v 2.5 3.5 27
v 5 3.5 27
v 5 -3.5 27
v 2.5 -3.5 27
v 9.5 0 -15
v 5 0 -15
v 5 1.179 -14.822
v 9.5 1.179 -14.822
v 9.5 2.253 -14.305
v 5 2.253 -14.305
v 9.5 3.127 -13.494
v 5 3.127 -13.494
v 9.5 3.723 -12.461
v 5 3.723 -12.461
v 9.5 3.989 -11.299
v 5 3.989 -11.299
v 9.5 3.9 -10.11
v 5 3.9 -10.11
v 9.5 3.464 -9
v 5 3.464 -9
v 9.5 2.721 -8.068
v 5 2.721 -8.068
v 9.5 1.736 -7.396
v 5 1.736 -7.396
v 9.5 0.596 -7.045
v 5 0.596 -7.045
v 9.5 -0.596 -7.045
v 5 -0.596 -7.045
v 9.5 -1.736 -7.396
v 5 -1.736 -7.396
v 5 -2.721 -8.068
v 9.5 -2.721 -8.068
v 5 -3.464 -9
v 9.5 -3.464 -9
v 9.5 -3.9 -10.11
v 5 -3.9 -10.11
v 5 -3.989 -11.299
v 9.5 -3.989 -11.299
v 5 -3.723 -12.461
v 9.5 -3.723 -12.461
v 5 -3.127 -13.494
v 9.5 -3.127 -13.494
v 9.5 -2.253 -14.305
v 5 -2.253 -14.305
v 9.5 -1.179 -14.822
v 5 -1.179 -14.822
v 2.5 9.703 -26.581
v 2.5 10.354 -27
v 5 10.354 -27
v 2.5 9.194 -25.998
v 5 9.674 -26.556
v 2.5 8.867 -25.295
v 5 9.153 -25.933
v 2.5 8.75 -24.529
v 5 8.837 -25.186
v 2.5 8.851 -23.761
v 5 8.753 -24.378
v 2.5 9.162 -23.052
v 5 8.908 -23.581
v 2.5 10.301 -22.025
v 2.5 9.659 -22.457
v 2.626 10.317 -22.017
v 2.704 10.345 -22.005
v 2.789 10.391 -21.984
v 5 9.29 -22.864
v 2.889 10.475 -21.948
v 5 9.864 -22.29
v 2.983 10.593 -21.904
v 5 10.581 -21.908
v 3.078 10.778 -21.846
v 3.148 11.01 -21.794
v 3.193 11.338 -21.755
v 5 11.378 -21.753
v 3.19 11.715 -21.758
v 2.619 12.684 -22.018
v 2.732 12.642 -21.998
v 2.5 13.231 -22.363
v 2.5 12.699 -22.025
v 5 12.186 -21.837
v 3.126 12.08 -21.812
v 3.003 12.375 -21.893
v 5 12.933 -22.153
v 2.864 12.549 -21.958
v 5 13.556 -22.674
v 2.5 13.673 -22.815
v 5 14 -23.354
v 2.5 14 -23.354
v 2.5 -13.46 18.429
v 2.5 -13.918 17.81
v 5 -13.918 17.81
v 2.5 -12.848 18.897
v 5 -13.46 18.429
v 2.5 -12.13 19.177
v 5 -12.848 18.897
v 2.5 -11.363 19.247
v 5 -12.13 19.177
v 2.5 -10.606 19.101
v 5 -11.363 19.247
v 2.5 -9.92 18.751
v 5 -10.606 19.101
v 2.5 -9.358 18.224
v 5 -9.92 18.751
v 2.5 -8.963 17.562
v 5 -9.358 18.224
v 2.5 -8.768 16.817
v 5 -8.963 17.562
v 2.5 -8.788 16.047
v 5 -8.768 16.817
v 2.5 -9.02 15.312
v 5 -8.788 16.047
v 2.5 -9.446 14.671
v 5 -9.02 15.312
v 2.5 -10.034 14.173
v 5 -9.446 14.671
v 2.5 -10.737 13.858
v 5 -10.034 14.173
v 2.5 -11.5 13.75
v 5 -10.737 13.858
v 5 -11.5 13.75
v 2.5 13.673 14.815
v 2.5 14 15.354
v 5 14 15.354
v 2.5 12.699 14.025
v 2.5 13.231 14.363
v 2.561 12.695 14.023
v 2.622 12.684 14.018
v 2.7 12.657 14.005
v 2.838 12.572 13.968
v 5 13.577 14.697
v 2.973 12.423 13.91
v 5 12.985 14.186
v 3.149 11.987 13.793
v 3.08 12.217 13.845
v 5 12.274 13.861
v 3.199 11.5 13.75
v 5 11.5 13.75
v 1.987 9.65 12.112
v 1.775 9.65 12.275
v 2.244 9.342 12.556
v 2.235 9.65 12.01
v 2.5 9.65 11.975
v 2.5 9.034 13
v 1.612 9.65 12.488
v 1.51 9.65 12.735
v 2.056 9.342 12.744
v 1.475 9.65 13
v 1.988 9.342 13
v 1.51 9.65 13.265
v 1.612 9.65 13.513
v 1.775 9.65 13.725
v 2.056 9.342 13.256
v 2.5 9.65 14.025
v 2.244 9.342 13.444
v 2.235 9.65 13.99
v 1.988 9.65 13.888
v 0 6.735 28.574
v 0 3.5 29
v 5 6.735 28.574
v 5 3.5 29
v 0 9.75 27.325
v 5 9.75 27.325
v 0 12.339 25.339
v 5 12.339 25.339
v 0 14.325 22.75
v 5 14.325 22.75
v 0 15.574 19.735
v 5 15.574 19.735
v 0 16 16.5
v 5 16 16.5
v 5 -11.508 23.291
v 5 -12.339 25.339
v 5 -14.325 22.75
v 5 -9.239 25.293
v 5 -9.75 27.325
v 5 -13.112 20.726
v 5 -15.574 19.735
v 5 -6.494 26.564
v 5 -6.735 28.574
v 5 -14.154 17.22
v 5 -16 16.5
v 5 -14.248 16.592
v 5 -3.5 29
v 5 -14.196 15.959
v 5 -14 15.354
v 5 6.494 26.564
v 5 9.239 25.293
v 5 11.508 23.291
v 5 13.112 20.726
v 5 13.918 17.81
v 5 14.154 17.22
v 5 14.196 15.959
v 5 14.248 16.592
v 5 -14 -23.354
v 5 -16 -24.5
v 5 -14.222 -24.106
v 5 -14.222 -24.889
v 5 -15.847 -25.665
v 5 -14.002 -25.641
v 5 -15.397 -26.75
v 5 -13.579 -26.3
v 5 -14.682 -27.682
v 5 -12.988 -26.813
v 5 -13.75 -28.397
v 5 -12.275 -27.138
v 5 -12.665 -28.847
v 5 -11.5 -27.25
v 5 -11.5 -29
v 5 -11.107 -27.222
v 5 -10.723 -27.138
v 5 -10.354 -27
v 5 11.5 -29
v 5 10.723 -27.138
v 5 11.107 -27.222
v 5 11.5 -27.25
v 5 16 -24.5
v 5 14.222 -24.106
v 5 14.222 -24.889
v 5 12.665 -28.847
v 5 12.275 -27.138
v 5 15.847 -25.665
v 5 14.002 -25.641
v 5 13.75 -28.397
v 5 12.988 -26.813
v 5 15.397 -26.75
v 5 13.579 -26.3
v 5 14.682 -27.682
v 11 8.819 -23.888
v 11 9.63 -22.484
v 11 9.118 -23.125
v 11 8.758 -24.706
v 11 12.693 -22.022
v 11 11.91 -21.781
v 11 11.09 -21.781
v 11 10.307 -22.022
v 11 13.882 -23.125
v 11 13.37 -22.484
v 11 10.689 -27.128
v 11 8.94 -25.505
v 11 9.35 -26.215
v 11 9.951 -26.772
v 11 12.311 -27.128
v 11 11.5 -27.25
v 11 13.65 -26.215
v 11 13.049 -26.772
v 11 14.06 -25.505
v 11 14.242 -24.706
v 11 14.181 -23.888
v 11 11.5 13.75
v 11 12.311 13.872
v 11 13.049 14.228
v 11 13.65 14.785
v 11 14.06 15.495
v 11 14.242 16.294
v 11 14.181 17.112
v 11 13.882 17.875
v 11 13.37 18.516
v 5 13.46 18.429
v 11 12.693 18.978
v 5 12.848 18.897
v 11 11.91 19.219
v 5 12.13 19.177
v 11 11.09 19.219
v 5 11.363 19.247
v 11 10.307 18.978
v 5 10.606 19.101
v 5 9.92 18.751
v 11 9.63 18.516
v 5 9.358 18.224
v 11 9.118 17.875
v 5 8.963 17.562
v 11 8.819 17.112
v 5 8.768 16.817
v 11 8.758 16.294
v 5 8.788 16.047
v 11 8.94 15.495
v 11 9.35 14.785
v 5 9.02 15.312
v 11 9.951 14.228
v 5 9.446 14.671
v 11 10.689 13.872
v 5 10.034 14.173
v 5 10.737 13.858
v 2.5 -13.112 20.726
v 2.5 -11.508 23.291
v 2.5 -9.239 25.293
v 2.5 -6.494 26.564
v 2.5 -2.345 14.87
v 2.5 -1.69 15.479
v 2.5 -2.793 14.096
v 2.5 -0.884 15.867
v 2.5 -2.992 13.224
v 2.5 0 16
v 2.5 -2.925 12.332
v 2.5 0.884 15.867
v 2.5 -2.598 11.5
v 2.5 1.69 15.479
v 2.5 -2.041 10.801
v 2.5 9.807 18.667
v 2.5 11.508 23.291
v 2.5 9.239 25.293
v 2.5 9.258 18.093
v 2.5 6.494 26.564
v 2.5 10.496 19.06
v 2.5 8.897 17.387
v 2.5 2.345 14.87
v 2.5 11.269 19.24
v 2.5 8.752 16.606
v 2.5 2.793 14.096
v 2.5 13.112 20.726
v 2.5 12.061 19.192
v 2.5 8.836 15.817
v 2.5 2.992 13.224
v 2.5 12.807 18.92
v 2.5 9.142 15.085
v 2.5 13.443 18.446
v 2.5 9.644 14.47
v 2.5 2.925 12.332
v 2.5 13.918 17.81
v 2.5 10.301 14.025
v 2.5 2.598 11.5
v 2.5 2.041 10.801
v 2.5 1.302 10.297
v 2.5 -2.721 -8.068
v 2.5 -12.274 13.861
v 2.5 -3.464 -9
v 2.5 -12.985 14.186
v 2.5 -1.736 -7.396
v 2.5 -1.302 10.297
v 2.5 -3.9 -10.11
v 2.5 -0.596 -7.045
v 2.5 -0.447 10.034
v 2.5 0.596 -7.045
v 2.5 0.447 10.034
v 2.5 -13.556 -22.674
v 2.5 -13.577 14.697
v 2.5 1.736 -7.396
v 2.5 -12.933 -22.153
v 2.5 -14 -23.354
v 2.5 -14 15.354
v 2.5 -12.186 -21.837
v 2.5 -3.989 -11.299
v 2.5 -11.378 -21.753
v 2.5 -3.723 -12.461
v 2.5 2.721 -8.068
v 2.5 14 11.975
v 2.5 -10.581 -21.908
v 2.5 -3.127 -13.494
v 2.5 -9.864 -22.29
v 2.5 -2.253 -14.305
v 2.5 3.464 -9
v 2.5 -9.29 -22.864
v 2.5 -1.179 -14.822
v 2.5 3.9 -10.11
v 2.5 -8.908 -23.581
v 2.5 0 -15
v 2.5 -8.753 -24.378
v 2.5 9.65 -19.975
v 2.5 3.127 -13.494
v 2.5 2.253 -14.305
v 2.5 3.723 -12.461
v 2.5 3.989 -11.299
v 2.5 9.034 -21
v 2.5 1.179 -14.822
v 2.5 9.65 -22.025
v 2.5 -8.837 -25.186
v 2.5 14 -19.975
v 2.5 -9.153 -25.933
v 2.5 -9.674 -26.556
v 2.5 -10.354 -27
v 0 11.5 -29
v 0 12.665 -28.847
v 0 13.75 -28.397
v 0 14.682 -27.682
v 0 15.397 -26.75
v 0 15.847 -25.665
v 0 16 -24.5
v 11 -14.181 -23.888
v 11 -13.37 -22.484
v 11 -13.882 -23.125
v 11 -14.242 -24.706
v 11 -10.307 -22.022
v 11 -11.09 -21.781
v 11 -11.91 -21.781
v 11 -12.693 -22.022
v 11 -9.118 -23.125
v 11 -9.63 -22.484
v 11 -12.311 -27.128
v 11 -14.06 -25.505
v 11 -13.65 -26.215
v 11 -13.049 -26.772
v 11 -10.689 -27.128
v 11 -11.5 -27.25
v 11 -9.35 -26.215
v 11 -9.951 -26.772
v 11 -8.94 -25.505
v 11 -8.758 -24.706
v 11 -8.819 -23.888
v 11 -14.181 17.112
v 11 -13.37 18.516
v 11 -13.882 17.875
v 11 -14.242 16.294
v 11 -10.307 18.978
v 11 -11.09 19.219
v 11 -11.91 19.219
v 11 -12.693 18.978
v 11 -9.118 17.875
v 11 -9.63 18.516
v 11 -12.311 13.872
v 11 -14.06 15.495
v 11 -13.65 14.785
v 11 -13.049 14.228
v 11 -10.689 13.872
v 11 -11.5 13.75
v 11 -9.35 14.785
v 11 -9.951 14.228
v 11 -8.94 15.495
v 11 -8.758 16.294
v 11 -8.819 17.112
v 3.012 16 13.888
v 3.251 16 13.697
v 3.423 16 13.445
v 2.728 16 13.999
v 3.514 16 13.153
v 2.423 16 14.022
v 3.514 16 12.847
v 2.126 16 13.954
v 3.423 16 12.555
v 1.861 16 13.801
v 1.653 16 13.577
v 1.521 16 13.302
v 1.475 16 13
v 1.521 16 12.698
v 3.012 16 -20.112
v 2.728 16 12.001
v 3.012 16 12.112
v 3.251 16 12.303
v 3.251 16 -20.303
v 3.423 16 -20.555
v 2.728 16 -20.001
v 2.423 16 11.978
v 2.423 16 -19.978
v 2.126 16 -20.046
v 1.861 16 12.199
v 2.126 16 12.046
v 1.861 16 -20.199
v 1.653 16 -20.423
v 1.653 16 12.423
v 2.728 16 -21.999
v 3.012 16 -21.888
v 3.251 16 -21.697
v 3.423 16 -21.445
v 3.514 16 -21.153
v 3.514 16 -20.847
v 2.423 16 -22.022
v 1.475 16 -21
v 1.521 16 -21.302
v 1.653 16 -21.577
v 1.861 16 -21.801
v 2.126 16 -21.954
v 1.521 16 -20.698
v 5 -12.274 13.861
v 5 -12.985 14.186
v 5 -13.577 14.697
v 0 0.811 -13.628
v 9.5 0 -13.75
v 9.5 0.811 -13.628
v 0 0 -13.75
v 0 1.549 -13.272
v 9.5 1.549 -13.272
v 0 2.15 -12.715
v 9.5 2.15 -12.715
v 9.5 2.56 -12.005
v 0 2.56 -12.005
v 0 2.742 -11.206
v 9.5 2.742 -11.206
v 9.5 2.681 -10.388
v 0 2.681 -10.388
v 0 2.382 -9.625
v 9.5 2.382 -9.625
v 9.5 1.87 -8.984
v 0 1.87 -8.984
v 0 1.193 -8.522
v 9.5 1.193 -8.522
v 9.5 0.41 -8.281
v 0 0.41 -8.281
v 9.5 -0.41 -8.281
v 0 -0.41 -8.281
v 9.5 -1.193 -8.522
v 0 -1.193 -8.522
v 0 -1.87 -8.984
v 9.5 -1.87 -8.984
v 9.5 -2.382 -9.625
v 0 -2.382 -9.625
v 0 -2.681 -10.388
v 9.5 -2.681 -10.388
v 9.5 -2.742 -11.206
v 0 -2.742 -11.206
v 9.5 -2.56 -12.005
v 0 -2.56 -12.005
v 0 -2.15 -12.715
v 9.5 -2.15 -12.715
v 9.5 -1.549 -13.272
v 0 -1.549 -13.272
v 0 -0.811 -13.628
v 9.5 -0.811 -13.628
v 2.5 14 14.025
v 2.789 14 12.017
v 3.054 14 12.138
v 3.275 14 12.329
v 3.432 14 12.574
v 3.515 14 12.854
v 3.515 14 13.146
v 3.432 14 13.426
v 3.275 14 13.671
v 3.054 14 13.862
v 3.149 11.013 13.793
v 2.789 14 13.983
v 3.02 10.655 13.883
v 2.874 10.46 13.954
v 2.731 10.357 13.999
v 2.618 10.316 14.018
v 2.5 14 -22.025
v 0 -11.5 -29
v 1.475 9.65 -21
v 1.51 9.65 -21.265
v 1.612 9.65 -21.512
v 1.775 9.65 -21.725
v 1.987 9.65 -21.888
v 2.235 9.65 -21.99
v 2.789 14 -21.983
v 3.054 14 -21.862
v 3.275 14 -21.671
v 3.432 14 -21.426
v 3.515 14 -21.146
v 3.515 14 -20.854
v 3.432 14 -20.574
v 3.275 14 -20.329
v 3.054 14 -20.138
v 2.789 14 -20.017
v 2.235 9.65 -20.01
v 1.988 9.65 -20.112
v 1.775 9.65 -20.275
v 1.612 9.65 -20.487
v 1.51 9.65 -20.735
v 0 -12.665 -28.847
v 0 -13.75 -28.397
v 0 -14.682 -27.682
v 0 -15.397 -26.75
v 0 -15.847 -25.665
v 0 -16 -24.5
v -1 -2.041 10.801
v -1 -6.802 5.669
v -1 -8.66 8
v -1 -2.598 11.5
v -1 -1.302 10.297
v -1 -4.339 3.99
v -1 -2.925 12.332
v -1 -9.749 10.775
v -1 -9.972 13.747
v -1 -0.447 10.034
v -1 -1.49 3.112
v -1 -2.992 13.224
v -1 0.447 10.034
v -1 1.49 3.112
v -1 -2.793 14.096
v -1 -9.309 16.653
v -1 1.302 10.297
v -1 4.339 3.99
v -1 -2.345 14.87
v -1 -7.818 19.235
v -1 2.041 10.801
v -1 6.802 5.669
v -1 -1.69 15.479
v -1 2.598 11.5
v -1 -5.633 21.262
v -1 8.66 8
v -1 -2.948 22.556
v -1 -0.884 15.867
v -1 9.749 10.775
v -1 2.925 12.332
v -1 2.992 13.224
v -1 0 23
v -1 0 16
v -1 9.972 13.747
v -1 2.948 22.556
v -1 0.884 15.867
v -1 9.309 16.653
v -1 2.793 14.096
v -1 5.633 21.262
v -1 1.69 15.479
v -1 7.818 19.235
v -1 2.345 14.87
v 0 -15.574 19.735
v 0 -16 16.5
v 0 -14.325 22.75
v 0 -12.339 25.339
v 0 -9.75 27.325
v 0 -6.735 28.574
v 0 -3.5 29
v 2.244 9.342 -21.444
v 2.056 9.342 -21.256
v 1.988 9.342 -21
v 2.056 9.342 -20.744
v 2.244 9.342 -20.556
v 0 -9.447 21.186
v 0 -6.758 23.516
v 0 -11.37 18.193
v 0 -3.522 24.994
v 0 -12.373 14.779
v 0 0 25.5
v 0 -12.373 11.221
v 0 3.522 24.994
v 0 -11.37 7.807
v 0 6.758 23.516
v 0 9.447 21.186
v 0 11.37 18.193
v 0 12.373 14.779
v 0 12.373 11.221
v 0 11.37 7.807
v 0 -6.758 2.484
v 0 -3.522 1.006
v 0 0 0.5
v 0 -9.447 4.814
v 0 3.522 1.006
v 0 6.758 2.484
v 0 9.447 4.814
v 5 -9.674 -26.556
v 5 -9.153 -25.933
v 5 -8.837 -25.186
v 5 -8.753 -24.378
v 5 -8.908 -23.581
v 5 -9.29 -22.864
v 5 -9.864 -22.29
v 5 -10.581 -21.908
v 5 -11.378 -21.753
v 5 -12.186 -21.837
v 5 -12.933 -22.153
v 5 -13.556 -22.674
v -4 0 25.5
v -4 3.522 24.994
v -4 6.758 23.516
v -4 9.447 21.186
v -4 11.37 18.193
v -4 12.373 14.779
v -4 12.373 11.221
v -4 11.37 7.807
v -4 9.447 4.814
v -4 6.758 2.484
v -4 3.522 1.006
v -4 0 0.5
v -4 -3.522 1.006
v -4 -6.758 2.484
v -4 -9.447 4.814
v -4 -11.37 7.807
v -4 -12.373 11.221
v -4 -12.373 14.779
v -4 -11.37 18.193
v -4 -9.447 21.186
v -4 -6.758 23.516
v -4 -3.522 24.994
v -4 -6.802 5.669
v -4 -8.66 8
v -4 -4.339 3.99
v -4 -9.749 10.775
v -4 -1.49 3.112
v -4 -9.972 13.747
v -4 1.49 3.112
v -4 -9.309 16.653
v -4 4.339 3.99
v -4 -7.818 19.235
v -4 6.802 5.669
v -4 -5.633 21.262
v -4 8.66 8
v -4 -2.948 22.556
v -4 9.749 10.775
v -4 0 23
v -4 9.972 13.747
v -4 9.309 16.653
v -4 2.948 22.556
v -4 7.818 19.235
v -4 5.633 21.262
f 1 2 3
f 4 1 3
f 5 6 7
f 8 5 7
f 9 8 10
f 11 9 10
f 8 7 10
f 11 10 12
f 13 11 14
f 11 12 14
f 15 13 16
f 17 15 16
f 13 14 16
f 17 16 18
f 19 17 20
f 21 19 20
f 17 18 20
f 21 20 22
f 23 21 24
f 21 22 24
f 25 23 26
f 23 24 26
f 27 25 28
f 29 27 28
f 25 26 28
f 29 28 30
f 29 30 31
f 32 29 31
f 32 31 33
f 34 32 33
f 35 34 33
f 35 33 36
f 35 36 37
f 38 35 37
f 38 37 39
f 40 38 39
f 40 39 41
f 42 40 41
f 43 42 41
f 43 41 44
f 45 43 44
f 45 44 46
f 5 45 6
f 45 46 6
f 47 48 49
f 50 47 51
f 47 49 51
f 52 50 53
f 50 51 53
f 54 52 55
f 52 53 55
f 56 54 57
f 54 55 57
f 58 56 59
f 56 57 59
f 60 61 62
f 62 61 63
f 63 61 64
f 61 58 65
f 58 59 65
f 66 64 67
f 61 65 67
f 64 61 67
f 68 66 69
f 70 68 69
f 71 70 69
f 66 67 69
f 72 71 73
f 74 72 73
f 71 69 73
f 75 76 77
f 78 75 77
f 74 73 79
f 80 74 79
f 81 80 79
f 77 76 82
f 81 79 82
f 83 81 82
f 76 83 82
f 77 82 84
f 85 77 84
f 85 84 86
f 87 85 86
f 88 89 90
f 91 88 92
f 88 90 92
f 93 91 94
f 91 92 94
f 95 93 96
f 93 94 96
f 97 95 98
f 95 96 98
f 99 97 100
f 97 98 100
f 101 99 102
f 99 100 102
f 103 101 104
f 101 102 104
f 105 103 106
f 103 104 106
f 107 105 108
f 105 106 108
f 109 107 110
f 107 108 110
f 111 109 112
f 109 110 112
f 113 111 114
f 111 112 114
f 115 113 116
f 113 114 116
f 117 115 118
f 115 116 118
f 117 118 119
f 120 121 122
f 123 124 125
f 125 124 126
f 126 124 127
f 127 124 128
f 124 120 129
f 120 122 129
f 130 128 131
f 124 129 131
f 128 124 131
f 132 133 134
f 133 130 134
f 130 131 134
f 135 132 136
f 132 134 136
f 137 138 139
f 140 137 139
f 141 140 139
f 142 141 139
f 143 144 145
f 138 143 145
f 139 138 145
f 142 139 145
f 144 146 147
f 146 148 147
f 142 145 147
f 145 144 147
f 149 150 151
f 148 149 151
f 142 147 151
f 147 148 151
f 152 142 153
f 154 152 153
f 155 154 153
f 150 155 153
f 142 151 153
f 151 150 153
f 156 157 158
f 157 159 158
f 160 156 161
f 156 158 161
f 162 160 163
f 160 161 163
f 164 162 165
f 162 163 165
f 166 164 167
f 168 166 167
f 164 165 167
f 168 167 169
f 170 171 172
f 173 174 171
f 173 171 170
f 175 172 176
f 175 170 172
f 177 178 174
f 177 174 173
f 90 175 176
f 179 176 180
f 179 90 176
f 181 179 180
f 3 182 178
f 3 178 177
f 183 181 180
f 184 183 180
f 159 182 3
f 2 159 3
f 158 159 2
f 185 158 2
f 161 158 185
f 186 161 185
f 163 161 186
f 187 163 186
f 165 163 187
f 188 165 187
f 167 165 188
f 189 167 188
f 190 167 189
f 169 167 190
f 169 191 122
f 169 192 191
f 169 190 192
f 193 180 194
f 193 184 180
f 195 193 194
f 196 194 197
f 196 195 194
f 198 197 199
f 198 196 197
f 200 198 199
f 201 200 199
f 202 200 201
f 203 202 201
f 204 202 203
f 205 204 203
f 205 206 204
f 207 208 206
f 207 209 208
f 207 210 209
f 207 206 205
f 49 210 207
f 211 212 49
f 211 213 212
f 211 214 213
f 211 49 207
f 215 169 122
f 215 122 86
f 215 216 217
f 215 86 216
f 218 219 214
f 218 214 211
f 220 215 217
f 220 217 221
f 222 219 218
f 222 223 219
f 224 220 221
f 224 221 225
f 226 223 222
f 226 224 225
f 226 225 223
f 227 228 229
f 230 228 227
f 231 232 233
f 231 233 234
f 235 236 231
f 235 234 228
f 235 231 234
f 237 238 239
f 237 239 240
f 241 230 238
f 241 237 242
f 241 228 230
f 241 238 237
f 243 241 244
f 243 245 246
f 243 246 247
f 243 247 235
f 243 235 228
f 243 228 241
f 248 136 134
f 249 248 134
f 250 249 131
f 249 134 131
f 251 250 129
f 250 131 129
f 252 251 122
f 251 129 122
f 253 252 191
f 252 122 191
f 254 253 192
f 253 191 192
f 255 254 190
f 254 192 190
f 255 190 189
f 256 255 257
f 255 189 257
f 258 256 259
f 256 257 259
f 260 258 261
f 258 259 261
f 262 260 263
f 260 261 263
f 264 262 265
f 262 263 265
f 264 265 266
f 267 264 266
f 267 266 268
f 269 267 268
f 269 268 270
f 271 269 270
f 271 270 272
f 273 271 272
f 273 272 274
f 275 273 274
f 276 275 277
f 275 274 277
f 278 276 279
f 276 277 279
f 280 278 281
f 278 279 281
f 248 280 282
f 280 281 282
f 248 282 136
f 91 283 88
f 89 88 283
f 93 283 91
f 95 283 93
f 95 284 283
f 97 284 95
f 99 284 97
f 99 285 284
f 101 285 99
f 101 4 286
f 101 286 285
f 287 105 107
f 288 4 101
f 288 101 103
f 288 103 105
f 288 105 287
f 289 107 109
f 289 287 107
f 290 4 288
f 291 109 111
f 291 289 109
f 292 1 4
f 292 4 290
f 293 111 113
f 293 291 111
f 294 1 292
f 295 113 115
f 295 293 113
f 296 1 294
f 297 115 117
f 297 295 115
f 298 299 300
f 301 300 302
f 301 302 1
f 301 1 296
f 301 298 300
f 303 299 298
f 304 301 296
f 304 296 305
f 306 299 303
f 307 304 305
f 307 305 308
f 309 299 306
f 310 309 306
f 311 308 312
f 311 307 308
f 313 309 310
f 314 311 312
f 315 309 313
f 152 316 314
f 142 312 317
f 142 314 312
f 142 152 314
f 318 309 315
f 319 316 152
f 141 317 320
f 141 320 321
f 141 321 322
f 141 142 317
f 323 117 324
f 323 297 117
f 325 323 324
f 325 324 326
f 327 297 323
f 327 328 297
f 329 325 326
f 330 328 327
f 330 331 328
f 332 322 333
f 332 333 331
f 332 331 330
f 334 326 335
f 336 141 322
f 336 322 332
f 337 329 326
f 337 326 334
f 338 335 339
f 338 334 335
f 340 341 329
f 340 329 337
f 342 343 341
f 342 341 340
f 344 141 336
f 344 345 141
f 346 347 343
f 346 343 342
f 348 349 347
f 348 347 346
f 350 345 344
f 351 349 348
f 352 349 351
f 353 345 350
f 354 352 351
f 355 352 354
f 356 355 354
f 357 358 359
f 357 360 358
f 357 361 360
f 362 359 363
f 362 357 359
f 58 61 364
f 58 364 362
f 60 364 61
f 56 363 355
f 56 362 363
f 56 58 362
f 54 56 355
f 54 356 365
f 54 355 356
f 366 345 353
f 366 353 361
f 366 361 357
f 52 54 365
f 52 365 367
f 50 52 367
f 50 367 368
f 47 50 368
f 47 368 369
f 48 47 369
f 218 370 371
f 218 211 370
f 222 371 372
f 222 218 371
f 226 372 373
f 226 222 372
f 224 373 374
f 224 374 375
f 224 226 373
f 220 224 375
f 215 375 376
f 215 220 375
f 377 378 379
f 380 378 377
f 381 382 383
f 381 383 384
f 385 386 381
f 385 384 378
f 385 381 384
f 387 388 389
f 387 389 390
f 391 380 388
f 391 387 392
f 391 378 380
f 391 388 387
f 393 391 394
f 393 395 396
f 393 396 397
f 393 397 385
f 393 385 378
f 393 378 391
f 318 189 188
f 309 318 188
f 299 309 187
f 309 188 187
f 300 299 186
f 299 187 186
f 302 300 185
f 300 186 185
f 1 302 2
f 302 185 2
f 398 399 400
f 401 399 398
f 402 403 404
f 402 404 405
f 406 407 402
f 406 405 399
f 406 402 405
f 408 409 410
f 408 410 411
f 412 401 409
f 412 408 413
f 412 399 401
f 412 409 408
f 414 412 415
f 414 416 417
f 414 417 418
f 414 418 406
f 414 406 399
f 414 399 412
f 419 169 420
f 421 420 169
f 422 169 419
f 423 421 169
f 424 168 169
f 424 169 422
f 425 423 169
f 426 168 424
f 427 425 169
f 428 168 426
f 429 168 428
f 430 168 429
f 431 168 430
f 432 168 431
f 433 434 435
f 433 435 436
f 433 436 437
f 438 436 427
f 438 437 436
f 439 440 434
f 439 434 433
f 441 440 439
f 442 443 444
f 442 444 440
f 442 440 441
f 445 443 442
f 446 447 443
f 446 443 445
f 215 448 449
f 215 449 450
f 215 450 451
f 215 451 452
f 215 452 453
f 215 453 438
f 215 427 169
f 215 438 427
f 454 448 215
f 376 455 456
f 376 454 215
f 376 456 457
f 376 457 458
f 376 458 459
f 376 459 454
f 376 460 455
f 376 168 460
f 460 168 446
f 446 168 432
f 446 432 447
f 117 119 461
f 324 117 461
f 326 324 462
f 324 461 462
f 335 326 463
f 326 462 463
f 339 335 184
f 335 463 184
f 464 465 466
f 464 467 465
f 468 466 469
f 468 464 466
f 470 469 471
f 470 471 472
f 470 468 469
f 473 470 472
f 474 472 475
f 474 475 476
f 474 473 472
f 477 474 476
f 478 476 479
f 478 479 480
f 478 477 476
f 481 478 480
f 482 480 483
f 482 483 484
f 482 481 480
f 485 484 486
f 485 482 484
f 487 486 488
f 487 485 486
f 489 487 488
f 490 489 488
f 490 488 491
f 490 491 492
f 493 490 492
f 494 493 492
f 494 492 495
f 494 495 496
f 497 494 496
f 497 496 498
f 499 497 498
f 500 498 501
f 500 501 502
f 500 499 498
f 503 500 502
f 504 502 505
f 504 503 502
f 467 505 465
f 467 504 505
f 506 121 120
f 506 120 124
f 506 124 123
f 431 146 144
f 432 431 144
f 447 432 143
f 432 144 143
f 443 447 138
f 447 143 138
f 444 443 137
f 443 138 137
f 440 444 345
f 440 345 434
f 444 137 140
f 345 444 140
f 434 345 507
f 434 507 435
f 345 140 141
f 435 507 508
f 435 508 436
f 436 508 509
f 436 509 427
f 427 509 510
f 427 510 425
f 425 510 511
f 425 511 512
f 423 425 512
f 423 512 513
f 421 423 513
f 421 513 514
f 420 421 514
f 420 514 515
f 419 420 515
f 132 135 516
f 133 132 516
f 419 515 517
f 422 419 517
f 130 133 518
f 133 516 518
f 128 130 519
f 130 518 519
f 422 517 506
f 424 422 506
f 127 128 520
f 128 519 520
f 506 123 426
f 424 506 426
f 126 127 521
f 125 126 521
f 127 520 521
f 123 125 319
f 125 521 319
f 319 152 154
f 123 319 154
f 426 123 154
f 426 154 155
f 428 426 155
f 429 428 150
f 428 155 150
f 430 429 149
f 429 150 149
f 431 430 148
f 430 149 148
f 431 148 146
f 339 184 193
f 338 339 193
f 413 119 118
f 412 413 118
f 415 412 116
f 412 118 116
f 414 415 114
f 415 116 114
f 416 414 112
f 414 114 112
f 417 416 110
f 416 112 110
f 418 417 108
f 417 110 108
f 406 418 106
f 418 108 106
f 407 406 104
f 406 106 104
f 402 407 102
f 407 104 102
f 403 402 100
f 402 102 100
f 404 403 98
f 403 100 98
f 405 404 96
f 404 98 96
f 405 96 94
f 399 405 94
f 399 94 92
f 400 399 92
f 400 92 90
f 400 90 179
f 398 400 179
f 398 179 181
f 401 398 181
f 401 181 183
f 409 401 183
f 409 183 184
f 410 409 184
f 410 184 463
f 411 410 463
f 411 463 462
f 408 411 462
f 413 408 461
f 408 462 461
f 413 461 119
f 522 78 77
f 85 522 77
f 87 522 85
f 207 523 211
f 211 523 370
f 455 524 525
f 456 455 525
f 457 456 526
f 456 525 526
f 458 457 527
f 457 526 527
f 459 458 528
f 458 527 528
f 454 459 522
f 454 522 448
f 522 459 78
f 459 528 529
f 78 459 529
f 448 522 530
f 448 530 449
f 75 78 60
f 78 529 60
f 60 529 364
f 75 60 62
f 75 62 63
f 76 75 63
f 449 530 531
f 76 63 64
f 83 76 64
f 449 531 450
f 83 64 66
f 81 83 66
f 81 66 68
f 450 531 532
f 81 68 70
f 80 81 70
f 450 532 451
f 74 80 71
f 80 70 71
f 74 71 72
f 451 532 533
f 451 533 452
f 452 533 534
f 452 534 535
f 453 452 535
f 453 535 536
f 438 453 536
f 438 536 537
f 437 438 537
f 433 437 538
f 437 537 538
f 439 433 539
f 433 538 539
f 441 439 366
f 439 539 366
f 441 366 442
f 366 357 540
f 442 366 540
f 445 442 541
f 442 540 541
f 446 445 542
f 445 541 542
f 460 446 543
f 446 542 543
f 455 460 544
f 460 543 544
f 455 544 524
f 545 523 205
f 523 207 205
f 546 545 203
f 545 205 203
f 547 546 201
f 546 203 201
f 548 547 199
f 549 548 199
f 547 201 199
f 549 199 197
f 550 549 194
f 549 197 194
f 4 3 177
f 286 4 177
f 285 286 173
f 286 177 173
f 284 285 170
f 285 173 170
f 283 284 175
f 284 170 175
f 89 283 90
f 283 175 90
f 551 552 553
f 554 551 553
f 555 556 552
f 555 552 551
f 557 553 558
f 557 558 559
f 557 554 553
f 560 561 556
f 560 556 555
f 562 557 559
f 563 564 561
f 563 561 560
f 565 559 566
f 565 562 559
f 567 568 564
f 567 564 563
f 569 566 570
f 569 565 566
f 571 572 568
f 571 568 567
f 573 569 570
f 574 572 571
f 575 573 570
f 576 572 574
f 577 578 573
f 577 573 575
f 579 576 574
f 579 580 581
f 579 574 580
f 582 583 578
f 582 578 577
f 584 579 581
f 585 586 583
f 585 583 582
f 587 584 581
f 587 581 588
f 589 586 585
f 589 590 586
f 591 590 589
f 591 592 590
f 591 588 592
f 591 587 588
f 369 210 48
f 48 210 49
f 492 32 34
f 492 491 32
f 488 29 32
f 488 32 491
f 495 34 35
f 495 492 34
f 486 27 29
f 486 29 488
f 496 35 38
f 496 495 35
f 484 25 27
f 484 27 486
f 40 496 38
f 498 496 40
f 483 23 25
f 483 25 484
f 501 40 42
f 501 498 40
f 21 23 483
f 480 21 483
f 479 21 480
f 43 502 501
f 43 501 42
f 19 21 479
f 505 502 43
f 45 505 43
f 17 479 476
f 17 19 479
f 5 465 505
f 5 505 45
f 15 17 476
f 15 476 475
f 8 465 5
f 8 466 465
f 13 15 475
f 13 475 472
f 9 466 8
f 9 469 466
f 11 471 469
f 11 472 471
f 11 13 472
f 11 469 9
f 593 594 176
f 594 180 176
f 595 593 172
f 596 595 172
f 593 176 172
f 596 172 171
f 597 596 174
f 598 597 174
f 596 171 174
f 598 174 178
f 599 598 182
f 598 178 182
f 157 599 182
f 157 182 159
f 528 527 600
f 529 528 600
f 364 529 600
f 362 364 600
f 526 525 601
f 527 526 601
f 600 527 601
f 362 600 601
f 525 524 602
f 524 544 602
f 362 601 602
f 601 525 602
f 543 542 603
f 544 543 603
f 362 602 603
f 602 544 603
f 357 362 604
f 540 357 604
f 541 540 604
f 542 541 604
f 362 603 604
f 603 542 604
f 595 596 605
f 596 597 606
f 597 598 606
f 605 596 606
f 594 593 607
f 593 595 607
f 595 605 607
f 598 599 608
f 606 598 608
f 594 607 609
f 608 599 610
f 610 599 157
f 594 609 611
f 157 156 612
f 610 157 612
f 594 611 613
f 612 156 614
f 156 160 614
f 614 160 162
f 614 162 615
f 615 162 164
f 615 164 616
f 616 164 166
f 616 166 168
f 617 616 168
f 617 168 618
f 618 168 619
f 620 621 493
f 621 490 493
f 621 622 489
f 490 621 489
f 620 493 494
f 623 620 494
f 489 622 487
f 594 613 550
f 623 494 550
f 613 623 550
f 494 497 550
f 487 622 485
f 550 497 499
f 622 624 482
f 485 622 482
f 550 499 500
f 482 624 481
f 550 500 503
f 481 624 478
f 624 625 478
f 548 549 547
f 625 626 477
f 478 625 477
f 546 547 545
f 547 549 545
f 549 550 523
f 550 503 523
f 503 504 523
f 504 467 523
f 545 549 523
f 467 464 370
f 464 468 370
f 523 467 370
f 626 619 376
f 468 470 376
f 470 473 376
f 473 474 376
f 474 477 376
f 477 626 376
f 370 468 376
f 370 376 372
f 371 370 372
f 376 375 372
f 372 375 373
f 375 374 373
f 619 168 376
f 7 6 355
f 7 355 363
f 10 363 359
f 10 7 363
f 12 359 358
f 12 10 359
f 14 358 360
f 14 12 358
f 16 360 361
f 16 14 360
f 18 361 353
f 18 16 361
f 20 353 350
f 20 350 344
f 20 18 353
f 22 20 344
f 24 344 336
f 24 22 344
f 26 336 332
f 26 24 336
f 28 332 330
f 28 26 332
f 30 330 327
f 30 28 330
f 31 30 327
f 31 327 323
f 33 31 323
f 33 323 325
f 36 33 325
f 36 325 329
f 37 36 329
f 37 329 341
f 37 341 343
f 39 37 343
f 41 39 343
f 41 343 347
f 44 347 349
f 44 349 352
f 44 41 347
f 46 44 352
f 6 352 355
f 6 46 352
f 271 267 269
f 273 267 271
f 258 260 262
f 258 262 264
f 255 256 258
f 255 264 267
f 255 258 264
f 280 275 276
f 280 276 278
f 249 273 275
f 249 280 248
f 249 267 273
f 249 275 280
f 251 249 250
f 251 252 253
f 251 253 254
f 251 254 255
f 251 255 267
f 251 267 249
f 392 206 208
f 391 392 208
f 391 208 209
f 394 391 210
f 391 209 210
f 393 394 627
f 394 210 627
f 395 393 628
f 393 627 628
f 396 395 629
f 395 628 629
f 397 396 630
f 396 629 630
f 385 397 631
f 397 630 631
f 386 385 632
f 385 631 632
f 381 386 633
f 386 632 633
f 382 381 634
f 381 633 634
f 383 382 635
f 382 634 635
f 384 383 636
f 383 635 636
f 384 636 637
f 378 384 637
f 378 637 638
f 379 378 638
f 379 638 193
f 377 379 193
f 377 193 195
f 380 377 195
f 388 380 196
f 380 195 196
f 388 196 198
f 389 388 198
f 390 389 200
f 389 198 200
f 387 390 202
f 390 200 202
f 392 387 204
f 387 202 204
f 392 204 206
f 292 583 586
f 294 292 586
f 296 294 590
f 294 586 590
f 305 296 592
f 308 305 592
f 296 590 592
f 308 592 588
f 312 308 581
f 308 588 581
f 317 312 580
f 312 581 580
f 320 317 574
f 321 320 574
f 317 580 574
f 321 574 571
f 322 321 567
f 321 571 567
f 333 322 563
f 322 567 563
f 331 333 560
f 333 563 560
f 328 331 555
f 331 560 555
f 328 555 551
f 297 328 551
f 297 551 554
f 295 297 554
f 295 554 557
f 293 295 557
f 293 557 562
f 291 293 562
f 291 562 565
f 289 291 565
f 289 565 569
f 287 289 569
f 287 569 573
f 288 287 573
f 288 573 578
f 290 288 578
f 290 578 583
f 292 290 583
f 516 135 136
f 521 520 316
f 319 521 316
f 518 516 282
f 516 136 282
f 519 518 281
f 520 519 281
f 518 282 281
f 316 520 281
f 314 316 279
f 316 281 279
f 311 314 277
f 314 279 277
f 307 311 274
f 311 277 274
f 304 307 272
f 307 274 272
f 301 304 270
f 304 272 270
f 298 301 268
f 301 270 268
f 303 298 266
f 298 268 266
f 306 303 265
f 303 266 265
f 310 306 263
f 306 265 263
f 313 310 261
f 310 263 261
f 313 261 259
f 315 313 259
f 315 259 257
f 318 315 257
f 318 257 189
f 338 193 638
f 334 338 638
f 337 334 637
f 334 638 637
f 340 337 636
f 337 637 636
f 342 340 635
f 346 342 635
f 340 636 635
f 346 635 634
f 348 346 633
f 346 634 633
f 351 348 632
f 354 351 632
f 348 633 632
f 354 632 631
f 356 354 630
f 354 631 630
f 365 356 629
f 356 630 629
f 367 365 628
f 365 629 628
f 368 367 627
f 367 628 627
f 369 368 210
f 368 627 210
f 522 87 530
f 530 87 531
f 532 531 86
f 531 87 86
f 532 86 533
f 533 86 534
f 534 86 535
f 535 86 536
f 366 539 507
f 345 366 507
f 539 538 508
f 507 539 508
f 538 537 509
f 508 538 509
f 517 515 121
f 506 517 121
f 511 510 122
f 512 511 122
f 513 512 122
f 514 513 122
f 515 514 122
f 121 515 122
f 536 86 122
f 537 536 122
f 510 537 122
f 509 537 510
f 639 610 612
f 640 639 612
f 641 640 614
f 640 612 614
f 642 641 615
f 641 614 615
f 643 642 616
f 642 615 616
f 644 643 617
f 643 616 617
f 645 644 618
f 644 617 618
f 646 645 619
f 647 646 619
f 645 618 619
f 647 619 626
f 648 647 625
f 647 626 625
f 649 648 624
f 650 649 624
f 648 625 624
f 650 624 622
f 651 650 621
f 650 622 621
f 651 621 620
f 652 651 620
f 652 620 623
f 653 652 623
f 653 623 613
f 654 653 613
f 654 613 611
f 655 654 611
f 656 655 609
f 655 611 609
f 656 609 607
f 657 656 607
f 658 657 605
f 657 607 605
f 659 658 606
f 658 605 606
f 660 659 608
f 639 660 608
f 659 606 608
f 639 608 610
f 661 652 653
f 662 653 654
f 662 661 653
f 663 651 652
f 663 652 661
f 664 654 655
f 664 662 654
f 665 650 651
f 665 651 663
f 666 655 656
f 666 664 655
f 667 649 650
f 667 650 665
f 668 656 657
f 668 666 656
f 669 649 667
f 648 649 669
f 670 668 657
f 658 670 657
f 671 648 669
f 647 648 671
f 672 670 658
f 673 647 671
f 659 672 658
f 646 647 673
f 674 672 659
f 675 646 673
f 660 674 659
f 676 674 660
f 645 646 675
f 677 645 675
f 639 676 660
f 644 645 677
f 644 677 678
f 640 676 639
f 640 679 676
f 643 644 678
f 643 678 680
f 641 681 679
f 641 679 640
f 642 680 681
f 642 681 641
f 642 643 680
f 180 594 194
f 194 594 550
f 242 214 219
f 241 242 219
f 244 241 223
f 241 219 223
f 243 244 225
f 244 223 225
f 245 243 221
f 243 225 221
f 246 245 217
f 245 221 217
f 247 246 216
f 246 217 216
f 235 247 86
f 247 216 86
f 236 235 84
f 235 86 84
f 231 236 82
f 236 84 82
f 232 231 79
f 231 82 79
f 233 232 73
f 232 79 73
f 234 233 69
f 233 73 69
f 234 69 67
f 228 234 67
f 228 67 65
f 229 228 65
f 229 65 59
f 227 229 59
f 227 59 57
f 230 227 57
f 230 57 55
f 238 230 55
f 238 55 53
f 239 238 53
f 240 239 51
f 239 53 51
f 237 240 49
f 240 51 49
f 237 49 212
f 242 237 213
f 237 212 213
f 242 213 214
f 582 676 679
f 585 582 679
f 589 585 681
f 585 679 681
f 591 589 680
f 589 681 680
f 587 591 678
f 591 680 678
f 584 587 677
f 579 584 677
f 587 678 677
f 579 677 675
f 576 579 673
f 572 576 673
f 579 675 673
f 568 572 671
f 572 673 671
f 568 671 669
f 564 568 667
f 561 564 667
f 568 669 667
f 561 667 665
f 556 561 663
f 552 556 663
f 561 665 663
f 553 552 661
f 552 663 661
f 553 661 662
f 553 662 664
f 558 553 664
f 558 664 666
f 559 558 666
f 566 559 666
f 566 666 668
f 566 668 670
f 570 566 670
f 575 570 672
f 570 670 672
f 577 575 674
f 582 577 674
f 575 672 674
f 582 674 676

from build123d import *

# Parameters (mm, degrees)
SKETCH1_W                    = 58
SKETCH1_H                    = 32
SKETCH1_R                    = 2.75
BOSS_EXTRUDE1_DEPTH          = 5
SKETCH2_R                    = 4
SKETCH2_R_2                  = 2.75
BOSS_EXTRUDE2_DEPTH          = 4.5
FILLET1_R                    = 4.5
FILLET2_R                    = 12.5
SKETCH4_R                    = 2.75
BOSS_EXTRUDE3_DEPTH          = 6
SKETCH8_R                    = 12.5
BOSS_EXTRUDE4_DEPTH          = 4
SKETCH9_R                    = 10
CUT_EXTRUDE2_DEPTH           = 3
SKETCH10_R                   = 3
CUT_EXTRUDE3_DEPTH           = 13
SKETCH3_R                    = 4
CUT_EXTRUDE1_DEPTH           = 2.5
M2_5X0_45_TAPPED_HOLE1_D     = 2.05
M2_5X0_45_TAPPED_HOLE1_DEPTH = 6.35
M2_5X0_45_TAPPED_HOLE1_TIP   = 0.615882135


with BuildPart() as part:
    # Sketch1 → Boss-Extrude1 (new body)
    with BuildSketch(Plane(origin=(0, 0, 0), x_dir=(0, 0, -1), z_dir=(1, 0, 0))):
        Rectangle(SKETCH1_W, SKETCH1_H)
        with Locations((11, 0)):
            Circle(SKETCH1_R, mode=Mode.SUBTRACT)
    extrude(amount=BOSS_EXTRUDE1_DEPTH)

    # Sketch2 → Boss-Extrude2 (add)
    with BuildSketch(Plane(origin=(5, 0, 0), x_dir=(0, 0, -1), z_dir=(1, 0, 0))):
        with Locations((11, 0)):
            Circle(SKETCH2_R)
        with Locations((11, 0)):
            Circle(SKETCH2_R_2, mode=Mode.SUBTRACT)
    extrude(amount=BOSS_EXTRUDE2_DEPTH)

    # Fillet1
    fillet1_edges = [part.edges().sort_by_distance(p)[0] for p in [
        (2.5, 16, -29),
        (2.5, -16, -29),
    ]]
    fillet(fillet1_edges, radius=FILLET1_R)

    # Fillet2
    fillet2_edges = [part.edges().sort_by_distance(p)[0] for p in [
        (2.5, -16, 29),
        (2.5, 16, 29),
    ]]
    fillet(fillet2_edges, radius=FILLET2_R)

    # Sketch4 → Boss-Extrude3 (add)
    with BuildSketch(Plane(origin=(5, 0, 0), x_dir=(0, 0, -1), z_dir=(1, 0, 0))):
        with Locations((24.5, 11.5)):
            Circle(SKETCH4_R)
        with Locations((24.5, -11.5)):
            Circle(SKETCH4_R)
        with Locations((-16.5, 11.5)):
            Circle(SKETCH4_R)
        with Locations((-16.5, -11.5)):
            Circle(SKETCH4_R)
    extrude(amount=BOSS_EXTRUDE3_DEPTH)

    # Sketch8 → Boss-Extrude4 (add)
    with BuildSketch(Plane.ZY):
        with Locations((13, 0)):
            Circle(SKETCH8_R)
    extrude(amount=BOSS_EXTRUDE4_DEPTH)

    # Sketch9 → Cut-Extrude2 (cut)
    with BuildSketch(Plane.ZY.offset(4)):
        with Locations((13, 0)):
            Circle(SKETCH9_R)
    extrude(amount=-CUT_EXTRUDE2_DEPTH, mode=Mode.SUBTRACT)

    # Sketch10 → Cut-Extrude3 (cut, through all)
    with BuildSketch(Plane.ZY.offset(1)):
        with Locations((13, 0)):
            Circle(SKETCH10_R)
    extrude(amount=-CUT_EXTRUDE3_DEPTH, mode=Mode.SUBTRACT)

    # Sketch3 → Cut-Extrude1 (cut)
    with BuildSketch(Plane(origin=(5, 0, 0), x_dir=(0, 0, -1), z_dir=(1, 0, 0))):
        with BuildLine():
            ThreePointArc((-17.809934015, 13.91796875), (-24.374144625, 10.446066975), (-27, 3.5))
            Line((-27, 3.5), (-27, -3.5))
            ThreePointArc((-27, -3.5), (-24.374144625, -10.446066975), (-17.809934015, -13.91796875))
            ThreePointArc((-17.809934015, -13.91796875), (-17.907156967, -9.13728773), (-13.75, -11.5))
            ThreePointArc((-13.75, -11.5), (-14.185586382, -12.98525742), (-15.354356076, -14))
            Line((-15.354356076, -14), (23.354356076, -14))
            ThreePointArc((23.354356076, -14), (22.555456352, -9.555456352), (27, -10.354356076))
            Line((27, -10.354356076), (27, 10.354356076))
            ThreePointArc((27, 10.354356076), (22.555456352, 9.555456352), (23.354356076, 14))
            Line((23.354356076, 14), (-15.354356076, 14))
            ThreePointArc((-15.354356076, 14), (-14.185586382, 12.98525742), (-13.75, 11.5))
            ThreePointArc((-13.75, 11.5), (-17.907156967, 9.13728773), (-17.809934015, 13.91796875))
        make_face()
        with Locations((11, 0)):
            Circle(SKETCH3_R, mode=Mode.SUBTRACT)
    extrude(amount=-CUT_EXTRUDE1_DEPTH, mode=Mode.SUBTRACT)

    # M2.5x0.45 Tapped Hole1
    with Locations(Plane(origin=(0, 16, 0), x_dir=(1, 0, 0), z_dir=(0, 1, 0))):
        with Locations((2.5, 21), (2.5, -13)):
            Hole(M2_5X0_45_TAPPED_HOLE1_D / 2, depth=M2_5X0_45_TAPPED_HOLE1_DEPTH)
            with Locations((0, 0, -(M2_5X0_45_TAPPED_HOLE1_DEPTH + M2_5X0_45_TAPPED_HOLE1_TIP / 2))):  # 118° drill point
                Cone(0, M2_5X0_45_TAPPED_HOLE1_D / 2, M2_5X0_45_TAPPED_HOLE1_TIP, mode=Mode.SUBTRACT)


solid = part.part
